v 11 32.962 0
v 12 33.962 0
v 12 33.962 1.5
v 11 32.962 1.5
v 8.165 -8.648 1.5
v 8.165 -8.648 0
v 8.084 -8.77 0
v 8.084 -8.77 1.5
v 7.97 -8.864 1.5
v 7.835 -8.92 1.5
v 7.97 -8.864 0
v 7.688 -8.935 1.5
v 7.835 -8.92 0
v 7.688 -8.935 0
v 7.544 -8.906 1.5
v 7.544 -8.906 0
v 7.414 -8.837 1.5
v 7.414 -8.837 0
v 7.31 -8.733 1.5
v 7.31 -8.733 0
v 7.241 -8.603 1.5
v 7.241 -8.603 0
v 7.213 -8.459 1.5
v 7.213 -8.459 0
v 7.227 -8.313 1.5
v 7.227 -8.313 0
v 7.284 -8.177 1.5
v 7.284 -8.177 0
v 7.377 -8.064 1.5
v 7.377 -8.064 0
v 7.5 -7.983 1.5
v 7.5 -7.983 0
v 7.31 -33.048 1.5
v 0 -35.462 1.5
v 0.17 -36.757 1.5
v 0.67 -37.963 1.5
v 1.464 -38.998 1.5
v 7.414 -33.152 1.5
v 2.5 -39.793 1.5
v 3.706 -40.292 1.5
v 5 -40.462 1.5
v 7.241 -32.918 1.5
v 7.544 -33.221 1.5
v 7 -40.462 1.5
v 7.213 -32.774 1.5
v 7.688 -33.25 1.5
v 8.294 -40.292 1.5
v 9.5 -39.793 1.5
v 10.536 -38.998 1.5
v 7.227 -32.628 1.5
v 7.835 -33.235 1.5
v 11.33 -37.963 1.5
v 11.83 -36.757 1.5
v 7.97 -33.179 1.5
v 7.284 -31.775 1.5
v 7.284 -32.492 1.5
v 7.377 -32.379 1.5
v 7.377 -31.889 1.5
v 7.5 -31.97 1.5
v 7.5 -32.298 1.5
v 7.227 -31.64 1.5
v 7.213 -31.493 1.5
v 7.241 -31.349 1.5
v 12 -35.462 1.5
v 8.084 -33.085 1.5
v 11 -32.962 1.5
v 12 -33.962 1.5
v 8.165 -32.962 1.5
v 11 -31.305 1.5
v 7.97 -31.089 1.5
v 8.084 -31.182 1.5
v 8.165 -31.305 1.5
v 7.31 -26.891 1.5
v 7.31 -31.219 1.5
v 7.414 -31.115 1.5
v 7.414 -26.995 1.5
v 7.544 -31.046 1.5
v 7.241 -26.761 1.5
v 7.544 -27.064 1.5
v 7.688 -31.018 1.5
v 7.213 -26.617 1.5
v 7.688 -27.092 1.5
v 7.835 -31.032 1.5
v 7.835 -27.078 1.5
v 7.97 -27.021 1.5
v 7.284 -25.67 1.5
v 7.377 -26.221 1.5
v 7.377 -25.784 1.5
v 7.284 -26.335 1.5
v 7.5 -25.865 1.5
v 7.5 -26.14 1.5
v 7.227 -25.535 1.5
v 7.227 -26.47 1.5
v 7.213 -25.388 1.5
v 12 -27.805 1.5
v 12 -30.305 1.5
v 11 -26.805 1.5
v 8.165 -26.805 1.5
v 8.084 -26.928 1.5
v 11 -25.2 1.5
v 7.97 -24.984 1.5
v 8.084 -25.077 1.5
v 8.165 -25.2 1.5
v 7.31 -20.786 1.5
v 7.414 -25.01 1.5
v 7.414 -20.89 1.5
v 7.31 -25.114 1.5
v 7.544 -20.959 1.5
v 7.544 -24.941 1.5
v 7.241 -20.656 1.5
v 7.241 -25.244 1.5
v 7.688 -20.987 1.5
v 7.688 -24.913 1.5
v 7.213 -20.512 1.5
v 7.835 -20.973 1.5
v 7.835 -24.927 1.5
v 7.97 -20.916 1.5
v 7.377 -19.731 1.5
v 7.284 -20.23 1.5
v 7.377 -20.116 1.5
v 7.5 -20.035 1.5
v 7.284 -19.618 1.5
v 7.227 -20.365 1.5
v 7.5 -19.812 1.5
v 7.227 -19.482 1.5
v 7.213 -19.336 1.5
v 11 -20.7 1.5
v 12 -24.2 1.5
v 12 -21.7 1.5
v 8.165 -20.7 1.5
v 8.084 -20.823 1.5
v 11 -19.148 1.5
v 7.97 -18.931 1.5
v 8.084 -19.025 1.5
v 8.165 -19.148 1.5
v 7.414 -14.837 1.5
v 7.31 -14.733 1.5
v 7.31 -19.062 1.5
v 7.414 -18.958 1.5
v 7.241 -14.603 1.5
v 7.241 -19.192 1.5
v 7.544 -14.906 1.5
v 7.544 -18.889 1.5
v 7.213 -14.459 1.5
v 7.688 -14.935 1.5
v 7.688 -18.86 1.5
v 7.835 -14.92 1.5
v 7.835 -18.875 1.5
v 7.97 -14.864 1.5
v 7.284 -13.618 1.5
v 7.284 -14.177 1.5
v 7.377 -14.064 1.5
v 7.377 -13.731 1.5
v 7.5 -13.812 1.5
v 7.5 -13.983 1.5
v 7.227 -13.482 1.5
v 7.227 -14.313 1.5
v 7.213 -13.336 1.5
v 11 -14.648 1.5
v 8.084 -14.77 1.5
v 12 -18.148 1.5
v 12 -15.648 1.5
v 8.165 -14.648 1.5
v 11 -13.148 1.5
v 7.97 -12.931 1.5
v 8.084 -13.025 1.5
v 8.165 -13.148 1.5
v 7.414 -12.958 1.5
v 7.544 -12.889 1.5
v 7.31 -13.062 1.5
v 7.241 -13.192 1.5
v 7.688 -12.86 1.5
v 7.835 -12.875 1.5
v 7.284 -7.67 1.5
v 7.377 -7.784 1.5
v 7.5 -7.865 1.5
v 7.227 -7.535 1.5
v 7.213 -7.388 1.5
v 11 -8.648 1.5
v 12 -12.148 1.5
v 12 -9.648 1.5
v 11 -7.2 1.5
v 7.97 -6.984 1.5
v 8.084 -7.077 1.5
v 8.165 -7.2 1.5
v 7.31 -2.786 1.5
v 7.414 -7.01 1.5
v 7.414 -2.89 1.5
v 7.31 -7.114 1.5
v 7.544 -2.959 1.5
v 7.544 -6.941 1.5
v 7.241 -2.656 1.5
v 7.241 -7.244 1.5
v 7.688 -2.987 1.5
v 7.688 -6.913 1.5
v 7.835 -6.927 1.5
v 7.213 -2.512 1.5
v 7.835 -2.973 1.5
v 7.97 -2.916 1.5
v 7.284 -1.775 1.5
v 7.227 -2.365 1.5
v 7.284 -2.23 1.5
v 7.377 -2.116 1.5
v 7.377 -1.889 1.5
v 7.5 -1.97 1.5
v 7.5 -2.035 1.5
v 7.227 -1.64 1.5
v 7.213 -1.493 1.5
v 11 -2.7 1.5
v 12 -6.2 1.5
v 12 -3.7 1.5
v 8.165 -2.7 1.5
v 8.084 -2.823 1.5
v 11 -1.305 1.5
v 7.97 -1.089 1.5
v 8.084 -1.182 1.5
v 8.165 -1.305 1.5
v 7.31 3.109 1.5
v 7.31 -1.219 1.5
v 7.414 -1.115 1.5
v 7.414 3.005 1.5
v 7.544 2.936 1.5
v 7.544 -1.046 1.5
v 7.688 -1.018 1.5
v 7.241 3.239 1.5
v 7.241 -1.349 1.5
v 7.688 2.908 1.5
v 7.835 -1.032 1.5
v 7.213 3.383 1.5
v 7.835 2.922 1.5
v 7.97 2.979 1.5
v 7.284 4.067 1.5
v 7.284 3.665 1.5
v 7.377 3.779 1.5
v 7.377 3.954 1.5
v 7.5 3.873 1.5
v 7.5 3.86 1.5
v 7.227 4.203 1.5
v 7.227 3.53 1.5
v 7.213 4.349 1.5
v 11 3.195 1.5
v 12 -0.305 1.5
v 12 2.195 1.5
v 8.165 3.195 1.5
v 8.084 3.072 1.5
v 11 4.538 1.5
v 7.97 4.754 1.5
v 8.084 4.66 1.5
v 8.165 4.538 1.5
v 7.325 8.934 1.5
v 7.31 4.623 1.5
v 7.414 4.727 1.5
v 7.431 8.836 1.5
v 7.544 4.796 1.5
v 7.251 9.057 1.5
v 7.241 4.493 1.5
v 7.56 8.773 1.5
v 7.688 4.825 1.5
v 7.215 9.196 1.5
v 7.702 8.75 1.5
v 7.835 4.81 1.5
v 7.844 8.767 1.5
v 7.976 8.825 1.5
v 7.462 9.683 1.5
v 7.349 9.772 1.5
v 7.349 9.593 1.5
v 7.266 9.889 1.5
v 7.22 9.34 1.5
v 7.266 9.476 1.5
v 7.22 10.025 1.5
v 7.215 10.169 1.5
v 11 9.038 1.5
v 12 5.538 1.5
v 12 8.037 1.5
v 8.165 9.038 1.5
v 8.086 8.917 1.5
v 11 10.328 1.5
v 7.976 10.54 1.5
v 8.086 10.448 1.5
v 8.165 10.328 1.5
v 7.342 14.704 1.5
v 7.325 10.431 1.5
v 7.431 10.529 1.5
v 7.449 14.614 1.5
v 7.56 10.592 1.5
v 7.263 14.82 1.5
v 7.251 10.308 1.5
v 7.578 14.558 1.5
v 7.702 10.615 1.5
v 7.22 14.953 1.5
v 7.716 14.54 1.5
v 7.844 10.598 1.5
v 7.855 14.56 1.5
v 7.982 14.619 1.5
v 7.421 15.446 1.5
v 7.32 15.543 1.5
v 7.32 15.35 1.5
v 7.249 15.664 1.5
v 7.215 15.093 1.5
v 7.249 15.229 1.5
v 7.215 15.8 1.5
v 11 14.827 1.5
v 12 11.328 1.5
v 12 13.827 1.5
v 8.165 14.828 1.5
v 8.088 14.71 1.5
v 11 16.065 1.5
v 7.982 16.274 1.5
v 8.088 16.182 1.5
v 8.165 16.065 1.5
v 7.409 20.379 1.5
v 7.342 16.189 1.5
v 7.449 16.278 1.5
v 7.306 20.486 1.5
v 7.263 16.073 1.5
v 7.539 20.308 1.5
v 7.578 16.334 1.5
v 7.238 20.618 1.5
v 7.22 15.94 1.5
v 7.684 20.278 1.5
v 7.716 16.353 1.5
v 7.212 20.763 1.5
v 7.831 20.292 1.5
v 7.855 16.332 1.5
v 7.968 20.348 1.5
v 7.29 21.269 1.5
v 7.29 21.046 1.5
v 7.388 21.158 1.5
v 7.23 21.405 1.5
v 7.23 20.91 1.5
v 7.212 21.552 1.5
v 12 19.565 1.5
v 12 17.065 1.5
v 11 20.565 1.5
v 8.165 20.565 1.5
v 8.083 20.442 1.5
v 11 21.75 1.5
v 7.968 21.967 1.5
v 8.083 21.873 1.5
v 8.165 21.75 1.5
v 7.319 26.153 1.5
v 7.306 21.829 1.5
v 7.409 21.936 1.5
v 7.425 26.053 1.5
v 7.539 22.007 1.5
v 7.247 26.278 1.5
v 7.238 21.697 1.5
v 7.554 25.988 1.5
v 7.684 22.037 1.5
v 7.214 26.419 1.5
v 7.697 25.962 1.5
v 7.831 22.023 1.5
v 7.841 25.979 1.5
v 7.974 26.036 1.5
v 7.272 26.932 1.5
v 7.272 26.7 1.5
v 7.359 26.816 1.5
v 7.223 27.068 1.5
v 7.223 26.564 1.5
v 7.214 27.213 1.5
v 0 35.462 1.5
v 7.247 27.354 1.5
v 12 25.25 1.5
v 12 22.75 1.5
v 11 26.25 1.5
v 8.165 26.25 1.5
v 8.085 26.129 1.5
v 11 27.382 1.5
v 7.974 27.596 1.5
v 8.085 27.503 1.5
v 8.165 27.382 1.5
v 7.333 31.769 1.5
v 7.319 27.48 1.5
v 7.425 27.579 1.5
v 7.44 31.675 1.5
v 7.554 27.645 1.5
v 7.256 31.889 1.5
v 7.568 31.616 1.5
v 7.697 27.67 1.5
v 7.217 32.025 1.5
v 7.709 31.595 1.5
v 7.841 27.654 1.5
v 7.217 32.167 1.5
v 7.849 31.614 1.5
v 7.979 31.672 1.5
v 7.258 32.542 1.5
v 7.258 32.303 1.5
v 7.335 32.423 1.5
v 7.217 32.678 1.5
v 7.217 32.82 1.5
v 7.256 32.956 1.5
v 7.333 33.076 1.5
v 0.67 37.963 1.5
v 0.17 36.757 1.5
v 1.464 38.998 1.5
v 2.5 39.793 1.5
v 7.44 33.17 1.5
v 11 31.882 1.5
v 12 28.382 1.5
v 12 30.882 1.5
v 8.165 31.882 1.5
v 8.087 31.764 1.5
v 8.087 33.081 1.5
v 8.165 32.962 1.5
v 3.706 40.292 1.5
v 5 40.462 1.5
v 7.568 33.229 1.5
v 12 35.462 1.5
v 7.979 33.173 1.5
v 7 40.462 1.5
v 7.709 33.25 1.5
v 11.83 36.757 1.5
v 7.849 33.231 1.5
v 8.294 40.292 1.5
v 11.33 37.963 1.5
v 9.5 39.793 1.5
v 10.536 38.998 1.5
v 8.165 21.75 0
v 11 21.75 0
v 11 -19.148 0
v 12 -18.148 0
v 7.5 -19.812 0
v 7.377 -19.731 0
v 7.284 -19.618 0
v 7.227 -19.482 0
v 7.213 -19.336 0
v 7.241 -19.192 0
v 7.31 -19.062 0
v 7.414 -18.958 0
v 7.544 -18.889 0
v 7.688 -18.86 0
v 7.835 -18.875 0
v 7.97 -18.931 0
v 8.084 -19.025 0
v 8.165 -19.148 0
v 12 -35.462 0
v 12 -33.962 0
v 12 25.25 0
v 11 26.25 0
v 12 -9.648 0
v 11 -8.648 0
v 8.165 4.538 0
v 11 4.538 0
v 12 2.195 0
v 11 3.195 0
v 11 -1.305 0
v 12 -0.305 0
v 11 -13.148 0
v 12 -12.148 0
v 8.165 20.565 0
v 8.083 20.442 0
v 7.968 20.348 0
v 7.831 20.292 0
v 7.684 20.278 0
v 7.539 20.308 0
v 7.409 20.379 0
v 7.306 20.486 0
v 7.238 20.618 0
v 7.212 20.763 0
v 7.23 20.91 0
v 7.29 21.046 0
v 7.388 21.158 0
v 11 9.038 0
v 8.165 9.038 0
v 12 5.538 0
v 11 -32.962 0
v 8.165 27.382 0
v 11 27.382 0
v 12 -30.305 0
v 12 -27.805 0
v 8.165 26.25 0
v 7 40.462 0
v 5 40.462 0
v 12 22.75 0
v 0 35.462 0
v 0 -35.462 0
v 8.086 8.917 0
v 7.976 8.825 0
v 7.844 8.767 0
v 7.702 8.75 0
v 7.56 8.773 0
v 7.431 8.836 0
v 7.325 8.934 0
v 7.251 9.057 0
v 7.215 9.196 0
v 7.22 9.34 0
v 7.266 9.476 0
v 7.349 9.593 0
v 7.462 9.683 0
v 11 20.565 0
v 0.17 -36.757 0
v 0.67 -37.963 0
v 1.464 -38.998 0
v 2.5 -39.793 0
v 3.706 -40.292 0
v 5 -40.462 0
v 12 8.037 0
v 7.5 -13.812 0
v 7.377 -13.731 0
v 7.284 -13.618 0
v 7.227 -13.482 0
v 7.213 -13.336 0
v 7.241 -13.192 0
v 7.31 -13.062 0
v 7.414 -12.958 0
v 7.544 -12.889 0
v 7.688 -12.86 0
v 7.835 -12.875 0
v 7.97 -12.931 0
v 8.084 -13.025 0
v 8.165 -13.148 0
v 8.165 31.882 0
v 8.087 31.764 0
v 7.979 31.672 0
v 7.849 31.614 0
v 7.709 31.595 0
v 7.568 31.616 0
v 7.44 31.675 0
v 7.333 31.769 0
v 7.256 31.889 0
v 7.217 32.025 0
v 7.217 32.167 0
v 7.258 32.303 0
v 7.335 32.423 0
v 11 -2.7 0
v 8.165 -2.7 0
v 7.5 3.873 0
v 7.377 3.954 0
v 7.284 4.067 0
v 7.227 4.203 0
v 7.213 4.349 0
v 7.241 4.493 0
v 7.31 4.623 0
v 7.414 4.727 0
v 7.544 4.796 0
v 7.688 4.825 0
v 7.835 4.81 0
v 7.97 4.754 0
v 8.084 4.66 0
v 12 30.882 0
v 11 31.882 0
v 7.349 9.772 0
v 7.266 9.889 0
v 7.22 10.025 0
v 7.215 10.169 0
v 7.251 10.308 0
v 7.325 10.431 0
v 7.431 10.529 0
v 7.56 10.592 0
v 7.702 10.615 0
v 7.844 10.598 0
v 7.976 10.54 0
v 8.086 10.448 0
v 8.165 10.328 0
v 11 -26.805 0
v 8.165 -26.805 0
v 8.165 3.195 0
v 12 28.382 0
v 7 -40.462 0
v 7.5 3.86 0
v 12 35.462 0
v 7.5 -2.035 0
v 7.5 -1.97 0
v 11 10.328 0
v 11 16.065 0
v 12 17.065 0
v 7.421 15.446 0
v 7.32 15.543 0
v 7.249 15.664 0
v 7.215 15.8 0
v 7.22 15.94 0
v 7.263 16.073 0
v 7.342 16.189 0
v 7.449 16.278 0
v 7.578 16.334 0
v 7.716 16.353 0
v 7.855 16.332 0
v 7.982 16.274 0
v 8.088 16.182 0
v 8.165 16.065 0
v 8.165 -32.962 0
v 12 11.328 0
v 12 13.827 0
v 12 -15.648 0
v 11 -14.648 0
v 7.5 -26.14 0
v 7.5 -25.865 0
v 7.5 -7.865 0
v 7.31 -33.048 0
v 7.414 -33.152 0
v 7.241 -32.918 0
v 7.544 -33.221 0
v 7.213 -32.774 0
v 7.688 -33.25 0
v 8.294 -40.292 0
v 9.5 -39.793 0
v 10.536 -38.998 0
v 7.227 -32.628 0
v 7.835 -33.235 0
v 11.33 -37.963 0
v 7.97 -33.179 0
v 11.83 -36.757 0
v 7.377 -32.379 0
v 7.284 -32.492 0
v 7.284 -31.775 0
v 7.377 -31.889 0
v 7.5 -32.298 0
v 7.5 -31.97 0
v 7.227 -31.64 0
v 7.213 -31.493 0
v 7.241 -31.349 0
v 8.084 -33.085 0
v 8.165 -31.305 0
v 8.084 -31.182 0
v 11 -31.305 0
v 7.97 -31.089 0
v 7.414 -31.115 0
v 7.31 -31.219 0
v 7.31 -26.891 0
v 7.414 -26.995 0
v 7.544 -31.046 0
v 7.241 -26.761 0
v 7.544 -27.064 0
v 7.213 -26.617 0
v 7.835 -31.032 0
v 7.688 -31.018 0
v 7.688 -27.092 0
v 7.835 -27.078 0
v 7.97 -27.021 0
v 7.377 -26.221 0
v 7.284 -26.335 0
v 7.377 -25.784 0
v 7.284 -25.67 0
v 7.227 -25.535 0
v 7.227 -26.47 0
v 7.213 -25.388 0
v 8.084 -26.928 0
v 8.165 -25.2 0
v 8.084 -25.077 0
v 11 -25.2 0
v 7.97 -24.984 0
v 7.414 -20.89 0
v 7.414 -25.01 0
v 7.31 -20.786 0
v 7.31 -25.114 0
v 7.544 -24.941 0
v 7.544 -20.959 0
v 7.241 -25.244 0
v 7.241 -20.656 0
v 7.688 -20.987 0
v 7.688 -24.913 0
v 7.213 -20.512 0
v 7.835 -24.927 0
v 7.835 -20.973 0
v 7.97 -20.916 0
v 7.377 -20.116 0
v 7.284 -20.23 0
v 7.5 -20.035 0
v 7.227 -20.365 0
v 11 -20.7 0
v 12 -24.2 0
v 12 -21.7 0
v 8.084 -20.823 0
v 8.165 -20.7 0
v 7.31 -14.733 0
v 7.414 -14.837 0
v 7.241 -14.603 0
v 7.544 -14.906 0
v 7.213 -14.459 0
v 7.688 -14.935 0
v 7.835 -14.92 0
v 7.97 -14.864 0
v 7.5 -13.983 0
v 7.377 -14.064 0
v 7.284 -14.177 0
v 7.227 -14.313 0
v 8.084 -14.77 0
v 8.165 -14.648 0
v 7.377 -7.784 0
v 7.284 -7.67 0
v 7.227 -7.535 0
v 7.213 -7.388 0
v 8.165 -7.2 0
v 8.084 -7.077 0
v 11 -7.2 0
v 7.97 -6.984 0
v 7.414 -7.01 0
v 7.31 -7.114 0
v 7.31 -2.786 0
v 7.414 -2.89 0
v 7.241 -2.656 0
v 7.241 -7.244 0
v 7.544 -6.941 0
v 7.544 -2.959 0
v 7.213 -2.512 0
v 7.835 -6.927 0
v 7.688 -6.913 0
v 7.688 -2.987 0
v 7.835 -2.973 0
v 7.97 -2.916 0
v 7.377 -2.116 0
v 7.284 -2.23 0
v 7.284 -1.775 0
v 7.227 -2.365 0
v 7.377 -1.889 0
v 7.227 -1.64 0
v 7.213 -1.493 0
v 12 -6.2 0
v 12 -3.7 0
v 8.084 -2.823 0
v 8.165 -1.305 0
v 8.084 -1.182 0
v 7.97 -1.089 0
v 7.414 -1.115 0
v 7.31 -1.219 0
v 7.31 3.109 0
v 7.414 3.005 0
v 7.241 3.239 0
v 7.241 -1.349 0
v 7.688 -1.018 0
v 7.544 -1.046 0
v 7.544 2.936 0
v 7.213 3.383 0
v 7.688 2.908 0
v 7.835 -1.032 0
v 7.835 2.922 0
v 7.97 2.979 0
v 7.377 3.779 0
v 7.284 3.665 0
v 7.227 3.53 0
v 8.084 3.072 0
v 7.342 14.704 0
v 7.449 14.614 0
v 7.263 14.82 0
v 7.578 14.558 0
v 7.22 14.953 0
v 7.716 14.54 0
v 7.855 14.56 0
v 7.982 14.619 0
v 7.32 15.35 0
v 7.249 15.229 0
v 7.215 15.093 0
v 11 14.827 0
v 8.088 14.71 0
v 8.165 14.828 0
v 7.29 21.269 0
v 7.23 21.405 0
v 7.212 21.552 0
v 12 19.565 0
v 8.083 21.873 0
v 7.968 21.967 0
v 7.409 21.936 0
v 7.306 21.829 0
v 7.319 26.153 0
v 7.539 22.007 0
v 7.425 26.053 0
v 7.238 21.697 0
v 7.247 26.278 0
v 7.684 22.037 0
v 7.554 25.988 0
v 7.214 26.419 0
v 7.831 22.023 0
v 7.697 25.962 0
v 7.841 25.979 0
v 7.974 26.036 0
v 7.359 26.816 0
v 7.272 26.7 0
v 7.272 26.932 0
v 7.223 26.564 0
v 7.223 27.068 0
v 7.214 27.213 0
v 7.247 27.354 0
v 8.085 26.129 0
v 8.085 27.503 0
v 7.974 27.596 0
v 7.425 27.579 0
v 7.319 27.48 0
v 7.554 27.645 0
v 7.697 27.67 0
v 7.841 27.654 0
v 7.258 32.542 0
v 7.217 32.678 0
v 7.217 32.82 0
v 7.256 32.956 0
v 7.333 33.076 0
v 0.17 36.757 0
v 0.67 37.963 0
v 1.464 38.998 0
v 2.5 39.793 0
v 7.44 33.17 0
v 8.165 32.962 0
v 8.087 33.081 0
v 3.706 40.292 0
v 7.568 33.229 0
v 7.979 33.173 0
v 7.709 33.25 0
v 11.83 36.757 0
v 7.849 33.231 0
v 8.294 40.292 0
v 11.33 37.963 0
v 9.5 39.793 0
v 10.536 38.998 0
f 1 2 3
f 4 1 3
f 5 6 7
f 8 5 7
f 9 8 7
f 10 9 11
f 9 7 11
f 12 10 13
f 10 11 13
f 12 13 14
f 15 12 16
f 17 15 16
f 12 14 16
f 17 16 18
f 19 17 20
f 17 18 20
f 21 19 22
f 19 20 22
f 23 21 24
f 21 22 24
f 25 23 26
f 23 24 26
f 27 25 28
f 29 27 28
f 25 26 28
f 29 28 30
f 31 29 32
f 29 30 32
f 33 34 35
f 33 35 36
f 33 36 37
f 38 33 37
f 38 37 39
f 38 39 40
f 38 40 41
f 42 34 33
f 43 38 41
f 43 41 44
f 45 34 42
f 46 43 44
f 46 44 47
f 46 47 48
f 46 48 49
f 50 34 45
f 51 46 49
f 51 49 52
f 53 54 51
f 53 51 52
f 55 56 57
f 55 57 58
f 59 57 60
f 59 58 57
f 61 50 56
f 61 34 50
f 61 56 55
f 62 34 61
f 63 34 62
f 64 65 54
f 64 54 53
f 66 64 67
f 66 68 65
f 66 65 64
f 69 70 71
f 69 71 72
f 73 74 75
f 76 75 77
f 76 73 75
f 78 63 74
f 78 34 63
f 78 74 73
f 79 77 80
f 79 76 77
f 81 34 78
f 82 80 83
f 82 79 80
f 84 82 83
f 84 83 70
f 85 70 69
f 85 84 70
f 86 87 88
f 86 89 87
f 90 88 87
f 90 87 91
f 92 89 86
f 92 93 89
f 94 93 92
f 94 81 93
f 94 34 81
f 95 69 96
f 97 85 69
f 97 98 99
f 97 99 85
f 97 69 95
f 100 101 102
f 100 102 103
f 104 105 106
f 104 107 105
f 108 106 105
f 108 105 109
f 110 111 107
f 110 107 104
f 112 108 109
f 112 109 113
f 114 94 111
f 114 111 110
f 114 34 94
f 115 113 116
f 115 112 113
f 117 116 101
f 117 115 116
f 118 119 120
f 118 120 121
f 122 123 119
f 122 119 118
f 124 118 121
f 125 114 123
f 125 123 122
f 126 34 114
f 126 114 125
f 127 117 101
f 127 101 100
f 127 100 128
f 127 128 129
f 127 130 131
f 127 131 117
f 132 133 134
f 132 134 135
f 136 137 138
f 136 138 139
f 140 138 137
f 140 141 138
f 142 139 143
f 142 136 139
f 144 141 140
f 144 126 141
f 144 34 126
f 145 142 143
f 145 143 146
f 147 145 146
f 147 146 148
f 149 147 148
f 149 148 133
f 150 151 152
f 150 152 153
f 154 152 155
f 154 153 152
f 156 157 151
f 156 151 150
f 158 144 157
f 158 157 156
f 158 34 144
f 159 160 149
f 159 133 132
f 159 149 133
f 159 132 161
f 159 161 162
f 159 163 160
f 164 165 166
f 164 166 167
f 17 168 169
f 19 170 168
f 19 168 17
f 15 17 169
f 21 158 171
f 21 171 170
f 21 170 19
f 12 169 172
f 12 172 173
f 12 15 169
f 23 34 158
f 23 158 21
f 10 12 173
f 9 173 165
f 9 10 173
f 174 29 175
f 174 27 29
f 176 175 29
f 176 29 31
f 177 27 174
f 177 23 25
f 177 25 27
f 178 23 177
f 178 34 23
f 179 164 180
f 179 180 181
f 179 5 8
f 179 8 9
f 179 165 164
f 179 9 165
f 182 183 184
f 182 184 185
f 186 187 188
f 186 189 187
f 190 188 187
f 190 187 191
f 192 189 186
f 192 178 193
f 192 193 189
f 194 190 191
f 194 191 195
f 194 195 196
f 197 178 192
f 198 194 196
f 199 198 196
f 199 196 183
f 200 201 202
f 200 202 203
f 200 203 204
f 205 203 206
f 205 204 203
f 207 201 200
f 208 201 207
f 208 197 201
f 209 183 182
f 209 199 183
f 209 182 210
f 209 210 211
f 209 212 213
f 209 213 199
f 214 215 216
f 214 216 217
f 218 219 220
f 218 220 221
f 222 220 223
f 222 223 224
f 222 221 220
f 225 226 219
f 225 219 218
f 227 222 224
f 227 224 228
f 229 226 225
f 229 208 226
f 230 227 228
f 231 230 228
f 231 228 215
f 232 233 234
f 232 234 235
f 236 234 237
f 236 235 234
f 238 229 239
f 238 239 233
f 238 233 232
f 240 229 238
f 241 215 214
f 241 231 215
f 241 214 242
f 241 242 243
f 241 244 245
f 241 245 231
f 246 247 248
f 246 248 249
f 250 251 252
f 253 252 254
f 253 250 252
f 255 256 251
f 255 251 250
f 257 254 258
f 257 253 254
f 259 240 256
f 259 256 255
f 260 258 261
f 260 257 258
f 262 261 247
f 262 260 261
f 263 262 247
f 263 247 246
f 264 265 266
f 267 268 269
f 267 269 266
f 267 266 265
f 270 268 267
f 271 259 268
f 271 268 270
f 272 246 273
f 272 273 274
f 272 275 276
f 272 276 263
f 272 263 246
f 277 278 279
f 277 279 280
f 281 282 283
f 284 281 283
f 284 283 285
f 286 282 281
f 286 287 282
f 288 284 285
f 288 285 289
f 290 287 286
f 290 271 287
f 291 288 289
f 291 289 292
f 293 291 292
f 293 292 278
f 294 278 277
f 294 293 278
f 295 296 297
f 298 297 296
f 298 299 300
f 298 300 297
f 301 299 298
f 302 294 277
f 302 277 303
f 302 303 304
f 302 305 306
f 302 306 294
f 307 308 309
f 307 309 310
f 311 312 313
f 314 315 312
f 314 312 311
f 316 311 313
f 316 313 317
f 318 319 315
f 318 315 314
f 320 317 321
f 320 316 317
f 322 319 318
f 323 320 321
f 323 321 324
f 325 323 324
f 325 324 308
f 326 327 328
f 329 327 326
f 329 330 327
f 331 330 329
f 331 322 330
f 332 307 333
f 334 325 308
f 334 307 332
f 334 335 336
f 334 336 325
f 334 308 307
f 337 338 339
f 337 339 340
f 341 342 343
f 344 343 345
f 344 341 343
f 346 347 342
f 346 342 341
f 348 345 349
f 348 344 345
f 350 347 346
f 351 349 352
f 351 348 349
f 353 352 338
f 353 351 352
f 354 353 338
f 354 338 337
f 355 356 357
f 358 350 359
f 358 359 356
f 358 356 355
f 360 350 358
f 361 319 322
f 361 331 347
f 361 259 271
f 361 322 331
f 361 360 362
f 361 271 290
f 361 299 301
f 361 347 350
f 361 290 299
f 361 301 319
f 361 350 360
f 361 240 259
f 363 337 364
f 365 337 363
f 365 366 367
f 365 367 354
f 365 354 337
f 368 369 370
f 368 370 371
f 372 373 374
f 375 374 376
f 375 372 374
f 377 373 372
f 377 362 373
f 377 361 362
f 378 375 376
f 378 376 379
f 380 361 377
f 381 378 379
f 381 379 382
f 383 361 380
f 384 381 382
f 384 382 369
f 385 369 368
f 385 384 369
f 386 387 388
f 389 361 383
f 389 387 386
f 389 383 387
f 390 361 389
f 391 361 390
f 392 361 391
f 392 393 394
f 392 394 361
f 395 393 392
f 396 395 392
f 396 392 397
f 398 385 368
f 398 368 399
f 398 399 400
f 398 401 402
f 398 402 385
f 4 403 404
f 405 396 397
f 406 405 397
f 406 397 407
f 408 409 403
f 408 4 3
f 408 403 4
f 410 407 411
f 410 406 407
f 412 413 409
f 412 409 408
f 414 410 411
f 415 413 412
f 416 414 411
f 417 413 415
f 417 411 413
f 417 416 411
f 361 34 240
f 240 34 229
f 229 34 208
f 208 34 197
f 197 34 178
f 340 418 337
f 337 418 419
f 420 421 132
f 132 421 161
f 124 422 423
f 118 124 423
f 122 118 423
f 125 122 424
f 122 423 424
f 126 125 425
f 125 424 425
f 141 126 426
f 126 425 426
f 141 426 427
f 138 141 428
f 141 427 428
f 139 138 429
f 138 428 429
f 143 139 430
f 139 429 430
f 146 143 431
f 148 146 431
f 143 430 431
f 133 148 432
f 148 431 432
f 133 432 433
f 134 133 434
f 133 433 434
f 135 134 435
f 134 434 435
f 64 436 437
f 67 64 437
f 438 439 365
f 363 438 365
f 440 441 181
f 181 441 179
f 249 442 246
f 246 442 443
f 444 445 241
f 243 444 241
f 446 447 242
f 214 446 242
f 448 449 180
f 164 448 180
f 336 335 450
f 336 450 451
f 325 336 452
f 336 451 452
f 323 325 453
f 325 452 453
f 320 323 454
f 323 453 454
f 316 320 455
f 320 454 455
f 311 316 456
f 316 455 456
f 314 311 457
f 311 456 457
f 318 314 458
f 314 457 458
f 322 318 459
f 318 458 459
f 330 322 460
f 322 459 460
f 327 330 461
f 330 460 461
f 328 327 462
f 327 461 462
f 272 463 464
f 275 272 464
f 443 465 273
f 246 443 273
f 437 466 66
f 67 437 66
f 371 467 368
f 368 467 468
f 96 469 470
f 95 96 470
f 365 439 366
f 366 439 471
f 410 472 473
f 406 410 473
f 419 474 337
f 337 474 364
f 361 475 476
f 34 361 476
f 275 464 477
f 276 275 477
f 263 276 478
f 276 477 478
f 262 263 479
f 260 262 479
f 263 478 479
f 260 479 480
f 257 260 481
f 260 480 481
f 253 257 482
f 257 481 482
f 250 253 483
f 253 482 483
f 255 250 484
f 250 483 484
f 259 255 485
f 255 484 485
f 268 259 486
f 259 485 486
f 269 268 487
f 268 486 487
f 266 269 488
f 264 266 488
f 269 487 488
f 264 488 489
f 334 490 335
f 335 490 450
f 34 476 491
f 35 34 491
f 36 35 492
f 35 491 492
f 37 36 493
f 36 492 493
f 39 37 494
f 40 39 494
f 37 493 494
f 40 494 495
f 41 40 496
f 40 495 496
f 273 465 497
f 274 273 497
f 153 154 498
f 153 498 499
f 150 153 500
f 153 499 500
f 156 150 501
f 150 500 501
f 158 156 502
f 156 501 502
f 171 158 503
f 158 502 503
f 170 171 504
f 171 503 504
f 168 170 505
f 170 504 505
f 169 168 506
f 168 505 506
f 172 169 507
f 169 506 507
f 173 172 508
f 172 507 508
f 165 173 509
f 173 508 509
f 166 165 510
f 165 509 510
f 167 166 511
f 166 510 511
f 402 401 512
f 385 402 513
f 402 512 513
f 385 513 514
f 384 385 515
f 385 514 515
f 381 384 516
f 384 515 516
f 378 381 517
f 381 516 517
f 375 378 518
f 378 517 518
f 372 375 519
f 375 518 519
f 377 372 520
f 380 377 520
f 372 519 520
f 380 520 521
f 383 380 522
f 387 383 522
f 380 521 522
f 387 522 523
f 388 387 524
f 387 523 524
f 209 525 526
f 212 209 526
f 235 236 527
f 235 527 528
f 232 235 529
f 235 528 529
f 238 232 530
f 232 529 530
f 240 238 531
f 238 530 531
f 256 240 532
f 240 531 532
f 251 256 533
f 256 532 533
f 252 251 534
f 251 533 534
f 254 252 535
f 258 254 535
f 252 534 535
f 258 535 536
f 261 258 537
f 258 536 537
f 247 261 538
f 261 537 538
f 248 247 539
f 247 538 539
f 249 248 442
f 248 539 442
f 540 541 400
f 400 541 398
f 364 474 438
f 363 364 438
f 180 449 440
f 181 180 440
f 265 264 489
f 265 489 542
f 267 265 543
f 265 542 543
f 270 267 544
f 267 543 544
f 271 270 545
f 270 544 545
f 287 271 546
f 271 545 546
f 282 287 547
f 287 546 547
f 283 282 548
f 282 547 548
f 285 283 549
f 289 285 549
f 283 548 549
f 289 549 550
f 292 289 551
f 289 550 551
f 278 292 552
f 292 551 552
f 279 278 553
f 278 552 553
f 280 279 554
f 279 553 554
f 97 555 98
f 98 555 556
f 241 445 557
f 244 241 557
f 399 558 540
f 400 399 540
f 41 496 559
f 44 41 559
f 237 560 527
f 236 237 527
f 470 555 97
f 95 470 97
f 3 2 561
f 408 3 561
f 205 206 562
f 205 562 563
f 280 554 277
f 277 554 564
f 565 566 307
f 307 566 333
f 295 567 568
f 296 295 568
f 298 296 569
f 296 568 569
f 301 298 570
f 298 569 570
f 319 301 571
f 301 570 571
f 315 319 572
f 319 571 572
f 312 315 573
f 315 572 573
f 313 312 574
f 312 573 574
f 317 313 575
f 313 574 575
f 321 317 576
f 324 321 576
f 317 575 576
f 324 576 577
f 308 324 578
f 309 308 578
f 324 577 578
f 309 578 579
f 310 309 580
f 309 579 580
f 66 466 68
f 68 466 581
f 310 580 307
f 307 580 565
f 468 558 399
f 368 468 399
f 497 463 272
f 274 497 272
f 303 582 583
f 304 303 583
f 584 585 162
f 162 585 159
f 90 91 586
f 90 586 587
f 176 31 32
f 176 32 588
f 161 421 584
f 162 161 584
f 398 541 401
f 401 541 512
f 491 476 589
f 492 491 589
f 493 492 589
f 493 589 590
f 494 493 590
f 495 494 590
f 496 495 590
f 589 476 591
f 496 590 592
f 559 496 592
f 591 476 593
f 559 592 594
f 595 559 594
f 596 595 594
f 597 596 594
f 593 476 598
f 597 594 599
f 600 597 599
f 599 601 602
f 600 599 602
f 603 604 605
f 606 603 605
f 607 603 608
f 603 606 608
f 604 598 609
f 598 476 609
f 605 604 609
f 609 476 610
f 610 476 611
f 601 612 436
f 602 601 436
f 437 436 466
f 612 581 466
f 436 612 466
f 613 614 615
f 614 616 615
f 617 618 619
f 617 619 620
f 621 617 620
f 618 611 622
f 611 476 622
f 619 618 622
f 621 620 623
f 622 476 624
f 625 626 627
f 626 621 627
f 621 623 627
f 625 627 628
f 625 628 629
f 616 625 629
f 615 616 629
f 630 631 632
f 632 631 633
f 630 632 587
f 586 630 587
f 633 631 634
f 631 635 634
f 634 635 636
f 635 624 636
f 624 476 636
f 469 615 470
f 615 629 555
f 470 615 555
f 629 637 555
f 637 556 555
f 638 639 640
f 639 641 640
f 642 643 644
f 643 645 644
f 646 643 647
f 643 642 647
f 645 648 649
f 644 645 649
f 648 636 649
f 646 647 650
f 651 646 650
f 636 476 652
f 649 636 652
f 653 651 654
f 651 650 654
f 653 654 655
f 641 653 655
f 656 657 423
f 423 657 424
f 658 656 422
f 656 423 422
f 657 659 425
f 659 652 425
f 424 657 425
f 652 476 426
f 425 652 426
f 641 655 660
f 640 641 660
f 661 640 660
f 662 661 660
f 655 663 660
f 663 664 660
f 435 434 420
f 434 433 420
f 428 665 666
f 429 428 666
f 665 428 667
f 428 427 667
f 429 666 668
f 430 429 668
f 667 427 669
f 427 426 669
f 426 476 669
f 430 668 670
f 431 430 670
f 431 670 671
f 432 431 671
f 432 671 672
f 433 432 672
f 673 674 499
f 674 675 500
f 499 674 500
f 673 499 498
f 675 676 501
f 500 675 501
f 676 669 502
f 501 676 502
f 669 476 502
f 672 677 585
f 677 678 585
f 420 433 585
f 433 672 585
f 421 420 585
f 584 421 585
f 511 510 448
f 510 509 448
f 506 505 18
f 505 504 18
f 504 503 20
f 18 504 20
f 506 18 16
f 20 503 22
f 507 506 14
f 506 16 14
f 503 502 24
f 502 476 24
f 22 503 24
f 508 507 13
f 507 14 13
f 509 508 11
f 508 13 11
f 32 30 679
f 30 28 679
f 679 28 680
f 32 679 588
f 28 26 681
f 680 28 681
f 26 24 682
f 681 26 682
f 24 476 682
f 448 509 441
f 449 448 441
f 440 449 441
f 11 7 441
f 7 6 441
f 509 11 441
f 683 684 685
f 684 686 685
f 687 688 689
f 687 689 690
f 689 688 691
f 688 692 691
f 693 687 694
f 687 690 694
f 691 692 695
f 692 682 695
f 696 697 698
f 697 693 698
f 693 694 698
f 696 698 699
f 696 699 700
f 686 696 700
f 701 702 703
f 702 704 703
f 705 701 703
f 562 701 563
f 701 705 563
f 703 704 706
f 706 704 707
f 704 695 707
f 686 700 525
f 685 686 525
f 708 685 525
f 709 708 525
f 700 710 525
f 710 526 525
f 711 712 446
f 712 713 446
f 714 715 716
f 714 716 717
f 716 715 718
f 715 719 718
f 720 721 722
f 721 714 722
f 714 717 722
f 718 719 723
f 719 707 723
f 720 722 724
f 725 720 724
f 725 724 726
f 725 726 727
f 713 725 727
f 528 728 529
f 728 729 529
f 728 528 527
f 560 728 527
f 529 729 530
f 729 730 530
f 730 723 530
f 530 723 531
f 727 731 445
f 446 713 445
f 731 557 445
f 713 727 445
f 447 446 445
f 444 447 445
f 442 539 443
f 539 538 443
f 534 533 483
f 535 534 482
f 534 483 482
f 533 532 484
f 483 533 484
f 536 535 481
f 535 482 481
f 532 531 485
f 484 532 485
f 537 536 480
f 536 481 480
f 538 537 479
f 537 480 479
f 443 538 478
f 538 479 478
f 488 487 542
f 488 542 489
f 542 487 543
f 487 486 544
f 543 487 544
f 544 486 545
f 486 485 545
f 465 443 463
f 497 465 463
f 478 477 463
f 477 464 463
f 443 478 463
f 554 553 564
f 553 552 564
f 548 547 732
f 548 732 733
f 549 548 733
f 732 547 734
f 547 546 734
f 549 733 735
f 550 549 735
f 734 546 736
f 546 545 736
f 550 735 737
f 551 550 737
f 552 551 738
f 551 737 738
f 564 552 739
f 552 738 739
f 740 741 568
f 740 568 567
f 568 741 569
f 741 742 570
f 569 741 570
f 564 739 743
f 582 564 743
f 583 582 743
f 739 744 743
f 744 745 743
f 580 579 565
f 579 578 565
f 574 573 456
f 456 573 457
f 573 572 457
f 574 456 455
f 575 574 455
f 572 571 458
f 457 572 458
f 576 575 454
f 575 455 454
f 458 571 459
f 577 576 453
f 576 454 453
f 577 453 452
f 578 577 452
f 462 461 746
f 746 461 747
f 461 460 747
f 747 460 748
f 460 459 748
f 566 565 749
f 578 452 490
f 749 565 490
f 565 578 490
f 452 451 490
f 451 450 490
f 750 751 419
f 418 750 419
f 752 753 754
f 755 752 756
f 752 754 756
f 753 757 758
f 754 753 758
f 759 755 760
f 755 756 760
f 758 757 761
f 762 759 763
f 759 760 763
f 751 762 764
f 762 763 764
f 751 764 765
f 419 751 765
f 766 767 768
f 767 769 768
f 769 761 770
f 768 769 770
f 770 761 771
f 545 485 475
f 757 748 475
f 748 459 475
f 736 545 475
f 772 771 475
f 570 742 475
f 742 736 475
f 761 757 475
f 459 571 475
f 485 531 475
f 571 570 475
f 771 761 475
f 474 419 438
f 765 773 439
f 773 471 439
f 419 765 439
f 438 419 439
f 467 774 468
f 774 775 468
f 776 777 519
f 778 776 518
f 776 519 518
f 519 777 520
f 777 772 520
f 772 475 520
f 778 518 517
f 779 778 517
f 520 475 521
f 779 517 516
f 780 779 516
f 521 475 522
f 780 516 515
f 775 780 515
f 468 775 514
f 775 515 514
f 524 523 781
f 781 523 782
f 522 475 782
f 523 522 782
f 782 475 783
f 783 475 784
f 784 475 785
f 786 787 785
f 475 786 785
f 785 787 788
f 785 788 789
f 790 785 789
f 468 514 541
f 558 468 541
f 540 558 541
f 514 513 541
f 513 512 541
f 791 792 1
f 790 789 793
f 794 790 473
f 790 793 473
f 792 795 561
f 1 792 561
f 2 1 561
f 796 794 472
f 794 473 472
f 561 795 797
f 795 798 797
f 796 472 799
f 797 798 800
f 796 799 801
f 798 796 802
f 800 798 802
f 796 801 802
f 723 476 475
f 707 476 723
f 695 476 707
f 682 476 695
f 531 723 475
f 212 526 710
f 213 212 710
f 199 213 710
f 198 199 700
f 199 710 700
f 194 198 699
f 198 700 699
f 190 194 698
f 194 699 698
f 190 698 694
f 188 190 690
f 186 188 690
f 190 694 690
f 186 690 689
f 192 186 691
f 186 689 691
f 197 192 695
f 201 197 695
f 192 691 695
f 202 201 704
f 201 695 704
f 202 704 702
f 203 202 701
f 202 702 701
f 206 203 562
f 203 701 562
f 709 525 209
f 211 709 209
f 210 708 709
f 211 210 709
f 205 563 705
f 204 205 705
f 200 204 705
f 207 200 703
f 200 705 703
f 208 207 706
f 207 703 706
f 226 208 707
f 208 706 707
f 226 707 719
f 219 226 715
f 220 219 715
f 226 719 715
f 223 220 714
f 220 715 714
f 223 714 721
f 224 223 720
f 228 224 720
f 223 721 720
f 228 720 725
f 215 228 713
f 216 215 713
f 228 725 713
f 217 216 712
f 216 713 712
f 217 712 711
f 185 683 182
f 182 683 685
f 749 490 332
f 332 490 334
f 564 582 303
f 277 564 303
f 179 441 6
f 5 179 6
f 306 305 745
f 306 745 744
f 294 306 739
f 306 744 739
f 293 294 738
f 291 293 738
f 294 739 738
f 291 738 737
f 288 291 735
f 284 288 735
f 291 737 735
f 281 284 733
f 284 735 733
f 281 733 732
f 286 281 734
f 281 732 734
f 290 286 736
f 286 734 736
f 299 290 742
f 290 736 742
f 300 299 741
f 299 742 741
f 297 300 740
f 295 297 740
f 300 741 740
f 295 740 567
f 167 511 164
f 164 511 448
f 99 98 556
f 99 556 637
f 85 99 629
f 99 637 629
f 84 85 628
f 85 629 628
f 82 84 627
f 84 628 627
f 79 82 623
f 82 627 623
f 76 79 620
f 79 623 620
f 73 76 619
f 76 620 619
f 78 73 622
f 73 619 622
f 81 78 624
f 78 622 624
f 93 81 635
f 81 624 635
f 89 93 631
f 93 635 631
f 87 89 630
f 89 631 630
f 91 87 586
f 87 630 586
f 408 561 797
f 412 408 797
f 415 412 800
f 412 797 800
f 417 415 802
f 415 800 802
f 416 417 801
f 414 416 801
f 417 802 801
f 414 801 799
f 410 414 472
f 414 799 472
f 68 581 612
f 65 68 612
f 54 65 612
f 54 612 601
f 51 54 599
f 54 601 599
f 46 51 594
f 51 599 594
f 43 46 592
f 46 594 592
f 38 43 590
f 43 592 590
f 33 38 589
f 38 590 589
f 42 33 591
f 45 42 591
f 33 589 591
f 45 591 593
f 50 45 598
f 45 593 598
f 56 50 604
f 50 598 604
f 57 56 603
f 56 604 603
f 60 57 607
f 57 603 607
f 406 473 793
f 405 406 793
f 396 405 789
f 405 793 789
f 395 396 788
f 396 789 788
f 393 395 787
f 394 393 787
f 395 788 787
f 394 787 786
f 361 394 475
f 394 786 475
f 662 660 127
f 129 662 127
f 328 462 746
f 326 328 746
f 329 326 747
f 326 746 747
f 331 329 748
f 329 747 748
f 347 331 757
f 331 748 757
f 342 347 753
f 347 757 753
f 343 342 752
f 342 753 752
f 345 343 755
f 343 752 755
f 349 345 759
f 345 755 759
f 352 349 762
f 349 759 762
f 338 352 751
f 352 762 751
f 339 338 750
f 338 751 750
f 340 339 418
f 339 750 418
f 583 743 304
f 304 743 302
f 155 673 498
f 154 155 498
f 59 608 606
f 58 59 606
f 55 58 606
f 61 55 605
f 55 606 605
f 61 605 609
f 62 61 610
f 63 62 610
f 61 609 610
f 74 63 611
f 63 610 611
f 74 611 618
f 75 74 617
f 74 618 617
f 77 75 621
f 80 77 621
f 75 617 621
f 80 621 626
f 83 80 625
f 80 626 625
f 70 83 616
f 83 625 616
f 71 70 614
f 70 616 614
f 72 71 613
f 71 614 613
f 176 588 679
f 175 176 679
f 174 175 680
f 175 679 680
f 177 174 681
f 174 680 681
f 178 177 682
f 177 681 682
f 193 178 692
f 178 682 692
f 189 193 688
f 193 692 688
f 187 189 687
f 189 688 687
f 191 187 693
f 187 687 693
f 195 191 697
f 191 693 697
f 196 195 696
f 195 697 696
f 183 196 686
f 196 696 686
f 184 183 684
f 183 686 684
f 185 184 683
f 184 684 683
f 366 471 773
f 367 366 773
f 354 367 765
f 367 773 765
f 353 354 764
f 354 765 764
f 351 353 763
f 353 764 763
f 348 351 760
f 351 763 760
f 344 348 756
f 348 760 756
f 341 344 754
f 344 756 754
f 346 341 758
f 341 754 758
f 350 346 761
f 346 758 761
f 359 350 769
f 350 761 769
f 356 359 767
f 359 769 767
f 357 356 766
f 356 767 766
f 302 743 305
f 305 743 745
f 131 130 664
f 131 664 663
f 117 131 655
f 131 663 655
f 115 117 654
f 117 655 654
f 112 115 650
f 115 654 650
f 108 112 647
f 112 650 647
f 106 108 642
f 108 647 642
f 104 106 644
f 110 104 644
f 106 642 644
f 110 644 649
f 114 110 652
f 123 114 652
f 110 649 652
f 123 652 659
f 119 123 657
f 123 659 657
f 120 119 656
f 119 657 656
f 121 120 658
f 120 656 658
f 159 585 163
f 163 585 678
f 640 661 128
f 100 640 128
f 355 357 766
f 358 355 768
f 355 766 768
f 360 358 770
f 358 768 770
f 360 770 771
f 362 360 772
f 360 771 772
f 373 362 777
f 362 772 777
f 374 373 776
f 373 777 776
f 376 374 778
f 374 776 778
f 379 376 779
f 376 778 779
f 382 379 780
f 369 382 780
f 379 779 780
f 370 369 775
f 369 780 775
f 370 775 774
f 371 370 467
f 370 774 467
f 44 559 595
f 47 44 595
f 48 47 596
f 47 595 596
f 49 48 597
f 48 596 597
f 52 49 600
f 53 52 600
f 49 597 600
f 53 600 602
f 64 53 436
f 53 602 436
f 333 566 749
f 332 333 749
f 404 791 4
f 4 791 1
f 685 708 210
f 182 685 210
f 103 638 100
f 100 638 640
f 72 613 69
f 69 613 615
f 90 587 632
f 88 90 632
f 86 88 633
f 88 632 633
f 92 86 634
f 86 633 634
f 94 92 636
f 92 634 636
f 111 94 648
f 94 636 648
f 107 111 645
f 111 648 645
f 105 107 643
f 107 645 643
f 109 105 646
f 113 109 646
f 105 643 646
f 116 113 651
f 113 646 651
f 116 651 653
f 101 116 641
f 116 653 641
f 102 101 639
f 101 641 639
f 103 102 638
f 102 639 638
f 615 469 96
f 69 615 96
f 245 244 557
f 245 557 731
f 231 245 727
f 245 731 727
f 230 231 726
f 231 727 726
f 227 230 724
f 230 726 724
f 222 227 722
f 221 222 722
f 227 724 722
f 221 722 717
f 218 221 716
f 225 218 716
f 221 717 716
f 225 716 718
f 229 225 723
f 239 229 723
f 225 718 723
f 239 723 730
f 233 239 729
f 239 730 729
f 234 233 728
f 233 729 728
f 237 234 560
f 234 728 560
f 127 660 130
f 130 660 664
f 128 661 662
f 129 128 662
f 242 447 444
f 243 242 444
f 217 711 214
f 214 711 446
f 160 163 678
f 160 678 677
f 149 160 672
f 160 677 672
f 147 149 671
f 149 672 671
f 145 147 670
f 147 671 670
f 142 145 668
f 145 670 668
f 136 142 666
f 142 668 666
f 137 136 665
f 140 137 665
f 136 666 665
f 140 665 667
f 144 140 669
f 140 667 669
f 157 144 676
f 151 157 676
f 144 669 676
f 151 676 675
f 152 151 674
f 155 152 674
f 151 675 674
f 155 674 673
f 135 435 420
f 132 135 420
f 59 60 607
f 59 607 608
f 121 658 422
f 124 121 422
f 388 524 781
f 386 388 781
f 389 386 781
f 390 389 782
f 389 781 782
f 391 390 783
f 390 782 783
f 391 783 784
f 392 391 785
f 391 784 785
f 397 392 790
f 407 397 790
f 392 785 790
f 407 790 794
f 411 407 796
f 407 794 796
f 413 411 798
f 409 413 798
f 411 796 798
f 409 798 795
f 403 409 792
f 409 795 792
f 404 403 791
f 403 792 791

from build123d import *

# Parameters (mm, degrees)
BOSS_EXTRUDE1_DEPTH   = 1.5
CHAMFER1_SIZE         = 1
F_1_0MM_DOWEL_HOLE1_D = 1


with BuildPart() as part:
    # Sketch1 → Boss-Extrude1 (new body)
    with BuildSketch(Plane.XY):
        with BuildLine():
            Line((0, 35.4625), (0, -35.4625))
            ThreePointArc((0, -35.4625), (1.464466094, -38.998033906), (5, -40.4625))
            Line((5, -40.4625), (7, -40.4625))
            ThreePointArc((7, -40.4625), (10.535533906, -38.998033906), (12, -35.4625))
            Line((12, -35.4625), (12, -32.9625))
            Line((12, -32.9625), (7.5, -32.9625))
            Line((7.5, -32.9625), (7.5, -31.305))
            Line((7.5, -31.305), (12, -31.305))
            Line((12, -31.305), (12, -26.805))
            Line((12, -26.805), (7.5, -26.805))
            Line((7.5, -26.805), (7.5, -25.2))
            Line((7.5, -25.2), (12, -25.2))
            Line((12, -25.2), (12, -20.7))
            Line((12, -20.7), (7.5, -20.7))
            Line((7.5, -20.7), (7.5, -19.1475))
            Line((7.5, -19.1475), (12, -19.1475))
            Line((12, -19.1475), (12, -14.6475))
            Line((12, -14.6475), (7.5, -14.6475))
            Line((7.5, -14.6475), (7.5, -13.1475))
            Line((7.5, -13.1475), (12, -13.1475))
            Line((12, -13.1475), (12, -8.6475))
            Line((12, -8.6475), (7.5, -8.6475))
            Line((7.5, -8.6475), (7.5, -7.2))
            Line((7.5, -7.2), (12, -7.2))
            Line((12, -7.2), (12, -2.7))
            Line((12, -2.7), (7.5, -2.7))
            Line((7.5, -2.7), (7.5, -1.305))
            Line((7.5, -1.305), (12, -1.305))
            Line((12, -1.305), (12, 3.195))
            Line((12, 3.195), (7.5, 3.195))
            Line((7.5, 3.195), (7.5, 4.5375))
            Line((7.5, 4.5375), (12, 4.5375))
            Line((12, 4.5375), (12, 9.0375))
            Line((12, 9.0375), (7.5, 9.0375))
            Line((7.5, 9.0375), (7.5, 10.3275))
            Line((7.5, 10.3275), (12, 10.3275))
            Line((12, 10.3275), (12, 14.8275))
            Line((12, 14.8275), (7.5, 14.8275))
            Line((7.5, 14.8275), (7.5, 16.065))
            Line((7.5, 16.065), (12, 16.065))
            Line((12, 16.065), (12, 20.565))
            Line((12, 20.565), (7.5, 20.565))
            Line((7.5, 20.565), (7.5, 21.75))
            Line((7.5, 21.75), (12, 21.75))
            Line((12, 21.75), (12, 26.25))
            Line((12, 26.25), (7.5, 26.25))
            Line((7.5, 26.25), (7.5, 27.3825))
            Line((7.5, 27.3825), (12, 27.3825))
            Line((12, 27.3825), (12, 31.8825))
            Line((12, 31.8825), (7.5, 31.8825))
            Line((7.5, 31.8825), (7.5, 32.9625))
            Line((7.5, 32.9625), (12, 32.9625))
            Line((12, 32.9625), (12, 35.4625))
            ThreePointArc((12, 35.4625), (10.535533906, 38.998033906), (7, 40.4625))
            Line((7, 40.4625), (5, 40.4625))
            ThreePointArc((5, 40.4625), (1.464466094, 38.998033906), (0, 35.4625))
        make_face()
    extrude(amount=BOSS_EXTRUDE1_DEPTH)

    # Chamfer1
    chamfer1_edges = [part.edges().sort_by_distance(p)[0] for p in [
        (12, 31.8825, 0.75),
        (12, 27.3825, 0.75),
        (12, 26.25, 0.75),
        (12, 21.75, 0.75),
        (12, 20.565, 0.75),
        (12, 16.065, 0.75),
        (12, 14.8275, 0.75),
        (12, 10.3275, 0.75),
        (12, 9.0375, 0.75),
        (12, 4.5375, 0.75),
        (12, 3.195, 0.75),
        (12, -1.305, 0.75),
        (12, -2.7, 0.75),
        (12, -7.2, 0.75),
        (12, -8.6475, 0.75),
        (12, -13.1475, 0.75),
        (12, -14.6475, 0.75),
        (12, -19.1475, 0.75),
        (12, -20.7, 0.75),
        (12, -25.2, 0.75),
        (12, -26.805, 0.75),
        (12, -31.305, 0.75),
        (12, -32.9625, 0.75),
        (12, 32.9625, 0.75),
    ]]
    chamfer(chamfer1_edges, length=CHAMFER1_SIZE)

    # Ø1.0mm Dowel Hole1 (through all)
    with Locations(Plane.XY.offset(1.5)):
        with Locations((7.712132034, 32.750367966), (7.712132034, 32.094632034), (7.712132034, 27.170367966), (7.712132034, 26.462132034), (7.712132034, 21.537867966), (7.712132034, 20.777132034), (7.712132034, 15.852867966), (7.712132034, 15.039632034), (7.712132034, 10.115367966), (7.712132034, 9.249632034), (7.712132034, 4.325367966), (7.712132034, 3.407132034), (7.712132034, -1.517132034), (7.712132034, -2.487867966), (7.712132034, -7.412132034), (7.712132034, -8.435367966), (7.712132034, -13.359632034), (7.712132034, -14.435367966), (7.712132034, -19.359632034), (7.712132034, -20.487867966), (7.712132034, -25.412132034), (7.712132034, -26.592867966), (7.712132034, -31.517132034), (7.712132034, -32.750367966)):
            Hole(F_1_0MM_DOWEL_HOLE1_D / 2)


solid = part.part
